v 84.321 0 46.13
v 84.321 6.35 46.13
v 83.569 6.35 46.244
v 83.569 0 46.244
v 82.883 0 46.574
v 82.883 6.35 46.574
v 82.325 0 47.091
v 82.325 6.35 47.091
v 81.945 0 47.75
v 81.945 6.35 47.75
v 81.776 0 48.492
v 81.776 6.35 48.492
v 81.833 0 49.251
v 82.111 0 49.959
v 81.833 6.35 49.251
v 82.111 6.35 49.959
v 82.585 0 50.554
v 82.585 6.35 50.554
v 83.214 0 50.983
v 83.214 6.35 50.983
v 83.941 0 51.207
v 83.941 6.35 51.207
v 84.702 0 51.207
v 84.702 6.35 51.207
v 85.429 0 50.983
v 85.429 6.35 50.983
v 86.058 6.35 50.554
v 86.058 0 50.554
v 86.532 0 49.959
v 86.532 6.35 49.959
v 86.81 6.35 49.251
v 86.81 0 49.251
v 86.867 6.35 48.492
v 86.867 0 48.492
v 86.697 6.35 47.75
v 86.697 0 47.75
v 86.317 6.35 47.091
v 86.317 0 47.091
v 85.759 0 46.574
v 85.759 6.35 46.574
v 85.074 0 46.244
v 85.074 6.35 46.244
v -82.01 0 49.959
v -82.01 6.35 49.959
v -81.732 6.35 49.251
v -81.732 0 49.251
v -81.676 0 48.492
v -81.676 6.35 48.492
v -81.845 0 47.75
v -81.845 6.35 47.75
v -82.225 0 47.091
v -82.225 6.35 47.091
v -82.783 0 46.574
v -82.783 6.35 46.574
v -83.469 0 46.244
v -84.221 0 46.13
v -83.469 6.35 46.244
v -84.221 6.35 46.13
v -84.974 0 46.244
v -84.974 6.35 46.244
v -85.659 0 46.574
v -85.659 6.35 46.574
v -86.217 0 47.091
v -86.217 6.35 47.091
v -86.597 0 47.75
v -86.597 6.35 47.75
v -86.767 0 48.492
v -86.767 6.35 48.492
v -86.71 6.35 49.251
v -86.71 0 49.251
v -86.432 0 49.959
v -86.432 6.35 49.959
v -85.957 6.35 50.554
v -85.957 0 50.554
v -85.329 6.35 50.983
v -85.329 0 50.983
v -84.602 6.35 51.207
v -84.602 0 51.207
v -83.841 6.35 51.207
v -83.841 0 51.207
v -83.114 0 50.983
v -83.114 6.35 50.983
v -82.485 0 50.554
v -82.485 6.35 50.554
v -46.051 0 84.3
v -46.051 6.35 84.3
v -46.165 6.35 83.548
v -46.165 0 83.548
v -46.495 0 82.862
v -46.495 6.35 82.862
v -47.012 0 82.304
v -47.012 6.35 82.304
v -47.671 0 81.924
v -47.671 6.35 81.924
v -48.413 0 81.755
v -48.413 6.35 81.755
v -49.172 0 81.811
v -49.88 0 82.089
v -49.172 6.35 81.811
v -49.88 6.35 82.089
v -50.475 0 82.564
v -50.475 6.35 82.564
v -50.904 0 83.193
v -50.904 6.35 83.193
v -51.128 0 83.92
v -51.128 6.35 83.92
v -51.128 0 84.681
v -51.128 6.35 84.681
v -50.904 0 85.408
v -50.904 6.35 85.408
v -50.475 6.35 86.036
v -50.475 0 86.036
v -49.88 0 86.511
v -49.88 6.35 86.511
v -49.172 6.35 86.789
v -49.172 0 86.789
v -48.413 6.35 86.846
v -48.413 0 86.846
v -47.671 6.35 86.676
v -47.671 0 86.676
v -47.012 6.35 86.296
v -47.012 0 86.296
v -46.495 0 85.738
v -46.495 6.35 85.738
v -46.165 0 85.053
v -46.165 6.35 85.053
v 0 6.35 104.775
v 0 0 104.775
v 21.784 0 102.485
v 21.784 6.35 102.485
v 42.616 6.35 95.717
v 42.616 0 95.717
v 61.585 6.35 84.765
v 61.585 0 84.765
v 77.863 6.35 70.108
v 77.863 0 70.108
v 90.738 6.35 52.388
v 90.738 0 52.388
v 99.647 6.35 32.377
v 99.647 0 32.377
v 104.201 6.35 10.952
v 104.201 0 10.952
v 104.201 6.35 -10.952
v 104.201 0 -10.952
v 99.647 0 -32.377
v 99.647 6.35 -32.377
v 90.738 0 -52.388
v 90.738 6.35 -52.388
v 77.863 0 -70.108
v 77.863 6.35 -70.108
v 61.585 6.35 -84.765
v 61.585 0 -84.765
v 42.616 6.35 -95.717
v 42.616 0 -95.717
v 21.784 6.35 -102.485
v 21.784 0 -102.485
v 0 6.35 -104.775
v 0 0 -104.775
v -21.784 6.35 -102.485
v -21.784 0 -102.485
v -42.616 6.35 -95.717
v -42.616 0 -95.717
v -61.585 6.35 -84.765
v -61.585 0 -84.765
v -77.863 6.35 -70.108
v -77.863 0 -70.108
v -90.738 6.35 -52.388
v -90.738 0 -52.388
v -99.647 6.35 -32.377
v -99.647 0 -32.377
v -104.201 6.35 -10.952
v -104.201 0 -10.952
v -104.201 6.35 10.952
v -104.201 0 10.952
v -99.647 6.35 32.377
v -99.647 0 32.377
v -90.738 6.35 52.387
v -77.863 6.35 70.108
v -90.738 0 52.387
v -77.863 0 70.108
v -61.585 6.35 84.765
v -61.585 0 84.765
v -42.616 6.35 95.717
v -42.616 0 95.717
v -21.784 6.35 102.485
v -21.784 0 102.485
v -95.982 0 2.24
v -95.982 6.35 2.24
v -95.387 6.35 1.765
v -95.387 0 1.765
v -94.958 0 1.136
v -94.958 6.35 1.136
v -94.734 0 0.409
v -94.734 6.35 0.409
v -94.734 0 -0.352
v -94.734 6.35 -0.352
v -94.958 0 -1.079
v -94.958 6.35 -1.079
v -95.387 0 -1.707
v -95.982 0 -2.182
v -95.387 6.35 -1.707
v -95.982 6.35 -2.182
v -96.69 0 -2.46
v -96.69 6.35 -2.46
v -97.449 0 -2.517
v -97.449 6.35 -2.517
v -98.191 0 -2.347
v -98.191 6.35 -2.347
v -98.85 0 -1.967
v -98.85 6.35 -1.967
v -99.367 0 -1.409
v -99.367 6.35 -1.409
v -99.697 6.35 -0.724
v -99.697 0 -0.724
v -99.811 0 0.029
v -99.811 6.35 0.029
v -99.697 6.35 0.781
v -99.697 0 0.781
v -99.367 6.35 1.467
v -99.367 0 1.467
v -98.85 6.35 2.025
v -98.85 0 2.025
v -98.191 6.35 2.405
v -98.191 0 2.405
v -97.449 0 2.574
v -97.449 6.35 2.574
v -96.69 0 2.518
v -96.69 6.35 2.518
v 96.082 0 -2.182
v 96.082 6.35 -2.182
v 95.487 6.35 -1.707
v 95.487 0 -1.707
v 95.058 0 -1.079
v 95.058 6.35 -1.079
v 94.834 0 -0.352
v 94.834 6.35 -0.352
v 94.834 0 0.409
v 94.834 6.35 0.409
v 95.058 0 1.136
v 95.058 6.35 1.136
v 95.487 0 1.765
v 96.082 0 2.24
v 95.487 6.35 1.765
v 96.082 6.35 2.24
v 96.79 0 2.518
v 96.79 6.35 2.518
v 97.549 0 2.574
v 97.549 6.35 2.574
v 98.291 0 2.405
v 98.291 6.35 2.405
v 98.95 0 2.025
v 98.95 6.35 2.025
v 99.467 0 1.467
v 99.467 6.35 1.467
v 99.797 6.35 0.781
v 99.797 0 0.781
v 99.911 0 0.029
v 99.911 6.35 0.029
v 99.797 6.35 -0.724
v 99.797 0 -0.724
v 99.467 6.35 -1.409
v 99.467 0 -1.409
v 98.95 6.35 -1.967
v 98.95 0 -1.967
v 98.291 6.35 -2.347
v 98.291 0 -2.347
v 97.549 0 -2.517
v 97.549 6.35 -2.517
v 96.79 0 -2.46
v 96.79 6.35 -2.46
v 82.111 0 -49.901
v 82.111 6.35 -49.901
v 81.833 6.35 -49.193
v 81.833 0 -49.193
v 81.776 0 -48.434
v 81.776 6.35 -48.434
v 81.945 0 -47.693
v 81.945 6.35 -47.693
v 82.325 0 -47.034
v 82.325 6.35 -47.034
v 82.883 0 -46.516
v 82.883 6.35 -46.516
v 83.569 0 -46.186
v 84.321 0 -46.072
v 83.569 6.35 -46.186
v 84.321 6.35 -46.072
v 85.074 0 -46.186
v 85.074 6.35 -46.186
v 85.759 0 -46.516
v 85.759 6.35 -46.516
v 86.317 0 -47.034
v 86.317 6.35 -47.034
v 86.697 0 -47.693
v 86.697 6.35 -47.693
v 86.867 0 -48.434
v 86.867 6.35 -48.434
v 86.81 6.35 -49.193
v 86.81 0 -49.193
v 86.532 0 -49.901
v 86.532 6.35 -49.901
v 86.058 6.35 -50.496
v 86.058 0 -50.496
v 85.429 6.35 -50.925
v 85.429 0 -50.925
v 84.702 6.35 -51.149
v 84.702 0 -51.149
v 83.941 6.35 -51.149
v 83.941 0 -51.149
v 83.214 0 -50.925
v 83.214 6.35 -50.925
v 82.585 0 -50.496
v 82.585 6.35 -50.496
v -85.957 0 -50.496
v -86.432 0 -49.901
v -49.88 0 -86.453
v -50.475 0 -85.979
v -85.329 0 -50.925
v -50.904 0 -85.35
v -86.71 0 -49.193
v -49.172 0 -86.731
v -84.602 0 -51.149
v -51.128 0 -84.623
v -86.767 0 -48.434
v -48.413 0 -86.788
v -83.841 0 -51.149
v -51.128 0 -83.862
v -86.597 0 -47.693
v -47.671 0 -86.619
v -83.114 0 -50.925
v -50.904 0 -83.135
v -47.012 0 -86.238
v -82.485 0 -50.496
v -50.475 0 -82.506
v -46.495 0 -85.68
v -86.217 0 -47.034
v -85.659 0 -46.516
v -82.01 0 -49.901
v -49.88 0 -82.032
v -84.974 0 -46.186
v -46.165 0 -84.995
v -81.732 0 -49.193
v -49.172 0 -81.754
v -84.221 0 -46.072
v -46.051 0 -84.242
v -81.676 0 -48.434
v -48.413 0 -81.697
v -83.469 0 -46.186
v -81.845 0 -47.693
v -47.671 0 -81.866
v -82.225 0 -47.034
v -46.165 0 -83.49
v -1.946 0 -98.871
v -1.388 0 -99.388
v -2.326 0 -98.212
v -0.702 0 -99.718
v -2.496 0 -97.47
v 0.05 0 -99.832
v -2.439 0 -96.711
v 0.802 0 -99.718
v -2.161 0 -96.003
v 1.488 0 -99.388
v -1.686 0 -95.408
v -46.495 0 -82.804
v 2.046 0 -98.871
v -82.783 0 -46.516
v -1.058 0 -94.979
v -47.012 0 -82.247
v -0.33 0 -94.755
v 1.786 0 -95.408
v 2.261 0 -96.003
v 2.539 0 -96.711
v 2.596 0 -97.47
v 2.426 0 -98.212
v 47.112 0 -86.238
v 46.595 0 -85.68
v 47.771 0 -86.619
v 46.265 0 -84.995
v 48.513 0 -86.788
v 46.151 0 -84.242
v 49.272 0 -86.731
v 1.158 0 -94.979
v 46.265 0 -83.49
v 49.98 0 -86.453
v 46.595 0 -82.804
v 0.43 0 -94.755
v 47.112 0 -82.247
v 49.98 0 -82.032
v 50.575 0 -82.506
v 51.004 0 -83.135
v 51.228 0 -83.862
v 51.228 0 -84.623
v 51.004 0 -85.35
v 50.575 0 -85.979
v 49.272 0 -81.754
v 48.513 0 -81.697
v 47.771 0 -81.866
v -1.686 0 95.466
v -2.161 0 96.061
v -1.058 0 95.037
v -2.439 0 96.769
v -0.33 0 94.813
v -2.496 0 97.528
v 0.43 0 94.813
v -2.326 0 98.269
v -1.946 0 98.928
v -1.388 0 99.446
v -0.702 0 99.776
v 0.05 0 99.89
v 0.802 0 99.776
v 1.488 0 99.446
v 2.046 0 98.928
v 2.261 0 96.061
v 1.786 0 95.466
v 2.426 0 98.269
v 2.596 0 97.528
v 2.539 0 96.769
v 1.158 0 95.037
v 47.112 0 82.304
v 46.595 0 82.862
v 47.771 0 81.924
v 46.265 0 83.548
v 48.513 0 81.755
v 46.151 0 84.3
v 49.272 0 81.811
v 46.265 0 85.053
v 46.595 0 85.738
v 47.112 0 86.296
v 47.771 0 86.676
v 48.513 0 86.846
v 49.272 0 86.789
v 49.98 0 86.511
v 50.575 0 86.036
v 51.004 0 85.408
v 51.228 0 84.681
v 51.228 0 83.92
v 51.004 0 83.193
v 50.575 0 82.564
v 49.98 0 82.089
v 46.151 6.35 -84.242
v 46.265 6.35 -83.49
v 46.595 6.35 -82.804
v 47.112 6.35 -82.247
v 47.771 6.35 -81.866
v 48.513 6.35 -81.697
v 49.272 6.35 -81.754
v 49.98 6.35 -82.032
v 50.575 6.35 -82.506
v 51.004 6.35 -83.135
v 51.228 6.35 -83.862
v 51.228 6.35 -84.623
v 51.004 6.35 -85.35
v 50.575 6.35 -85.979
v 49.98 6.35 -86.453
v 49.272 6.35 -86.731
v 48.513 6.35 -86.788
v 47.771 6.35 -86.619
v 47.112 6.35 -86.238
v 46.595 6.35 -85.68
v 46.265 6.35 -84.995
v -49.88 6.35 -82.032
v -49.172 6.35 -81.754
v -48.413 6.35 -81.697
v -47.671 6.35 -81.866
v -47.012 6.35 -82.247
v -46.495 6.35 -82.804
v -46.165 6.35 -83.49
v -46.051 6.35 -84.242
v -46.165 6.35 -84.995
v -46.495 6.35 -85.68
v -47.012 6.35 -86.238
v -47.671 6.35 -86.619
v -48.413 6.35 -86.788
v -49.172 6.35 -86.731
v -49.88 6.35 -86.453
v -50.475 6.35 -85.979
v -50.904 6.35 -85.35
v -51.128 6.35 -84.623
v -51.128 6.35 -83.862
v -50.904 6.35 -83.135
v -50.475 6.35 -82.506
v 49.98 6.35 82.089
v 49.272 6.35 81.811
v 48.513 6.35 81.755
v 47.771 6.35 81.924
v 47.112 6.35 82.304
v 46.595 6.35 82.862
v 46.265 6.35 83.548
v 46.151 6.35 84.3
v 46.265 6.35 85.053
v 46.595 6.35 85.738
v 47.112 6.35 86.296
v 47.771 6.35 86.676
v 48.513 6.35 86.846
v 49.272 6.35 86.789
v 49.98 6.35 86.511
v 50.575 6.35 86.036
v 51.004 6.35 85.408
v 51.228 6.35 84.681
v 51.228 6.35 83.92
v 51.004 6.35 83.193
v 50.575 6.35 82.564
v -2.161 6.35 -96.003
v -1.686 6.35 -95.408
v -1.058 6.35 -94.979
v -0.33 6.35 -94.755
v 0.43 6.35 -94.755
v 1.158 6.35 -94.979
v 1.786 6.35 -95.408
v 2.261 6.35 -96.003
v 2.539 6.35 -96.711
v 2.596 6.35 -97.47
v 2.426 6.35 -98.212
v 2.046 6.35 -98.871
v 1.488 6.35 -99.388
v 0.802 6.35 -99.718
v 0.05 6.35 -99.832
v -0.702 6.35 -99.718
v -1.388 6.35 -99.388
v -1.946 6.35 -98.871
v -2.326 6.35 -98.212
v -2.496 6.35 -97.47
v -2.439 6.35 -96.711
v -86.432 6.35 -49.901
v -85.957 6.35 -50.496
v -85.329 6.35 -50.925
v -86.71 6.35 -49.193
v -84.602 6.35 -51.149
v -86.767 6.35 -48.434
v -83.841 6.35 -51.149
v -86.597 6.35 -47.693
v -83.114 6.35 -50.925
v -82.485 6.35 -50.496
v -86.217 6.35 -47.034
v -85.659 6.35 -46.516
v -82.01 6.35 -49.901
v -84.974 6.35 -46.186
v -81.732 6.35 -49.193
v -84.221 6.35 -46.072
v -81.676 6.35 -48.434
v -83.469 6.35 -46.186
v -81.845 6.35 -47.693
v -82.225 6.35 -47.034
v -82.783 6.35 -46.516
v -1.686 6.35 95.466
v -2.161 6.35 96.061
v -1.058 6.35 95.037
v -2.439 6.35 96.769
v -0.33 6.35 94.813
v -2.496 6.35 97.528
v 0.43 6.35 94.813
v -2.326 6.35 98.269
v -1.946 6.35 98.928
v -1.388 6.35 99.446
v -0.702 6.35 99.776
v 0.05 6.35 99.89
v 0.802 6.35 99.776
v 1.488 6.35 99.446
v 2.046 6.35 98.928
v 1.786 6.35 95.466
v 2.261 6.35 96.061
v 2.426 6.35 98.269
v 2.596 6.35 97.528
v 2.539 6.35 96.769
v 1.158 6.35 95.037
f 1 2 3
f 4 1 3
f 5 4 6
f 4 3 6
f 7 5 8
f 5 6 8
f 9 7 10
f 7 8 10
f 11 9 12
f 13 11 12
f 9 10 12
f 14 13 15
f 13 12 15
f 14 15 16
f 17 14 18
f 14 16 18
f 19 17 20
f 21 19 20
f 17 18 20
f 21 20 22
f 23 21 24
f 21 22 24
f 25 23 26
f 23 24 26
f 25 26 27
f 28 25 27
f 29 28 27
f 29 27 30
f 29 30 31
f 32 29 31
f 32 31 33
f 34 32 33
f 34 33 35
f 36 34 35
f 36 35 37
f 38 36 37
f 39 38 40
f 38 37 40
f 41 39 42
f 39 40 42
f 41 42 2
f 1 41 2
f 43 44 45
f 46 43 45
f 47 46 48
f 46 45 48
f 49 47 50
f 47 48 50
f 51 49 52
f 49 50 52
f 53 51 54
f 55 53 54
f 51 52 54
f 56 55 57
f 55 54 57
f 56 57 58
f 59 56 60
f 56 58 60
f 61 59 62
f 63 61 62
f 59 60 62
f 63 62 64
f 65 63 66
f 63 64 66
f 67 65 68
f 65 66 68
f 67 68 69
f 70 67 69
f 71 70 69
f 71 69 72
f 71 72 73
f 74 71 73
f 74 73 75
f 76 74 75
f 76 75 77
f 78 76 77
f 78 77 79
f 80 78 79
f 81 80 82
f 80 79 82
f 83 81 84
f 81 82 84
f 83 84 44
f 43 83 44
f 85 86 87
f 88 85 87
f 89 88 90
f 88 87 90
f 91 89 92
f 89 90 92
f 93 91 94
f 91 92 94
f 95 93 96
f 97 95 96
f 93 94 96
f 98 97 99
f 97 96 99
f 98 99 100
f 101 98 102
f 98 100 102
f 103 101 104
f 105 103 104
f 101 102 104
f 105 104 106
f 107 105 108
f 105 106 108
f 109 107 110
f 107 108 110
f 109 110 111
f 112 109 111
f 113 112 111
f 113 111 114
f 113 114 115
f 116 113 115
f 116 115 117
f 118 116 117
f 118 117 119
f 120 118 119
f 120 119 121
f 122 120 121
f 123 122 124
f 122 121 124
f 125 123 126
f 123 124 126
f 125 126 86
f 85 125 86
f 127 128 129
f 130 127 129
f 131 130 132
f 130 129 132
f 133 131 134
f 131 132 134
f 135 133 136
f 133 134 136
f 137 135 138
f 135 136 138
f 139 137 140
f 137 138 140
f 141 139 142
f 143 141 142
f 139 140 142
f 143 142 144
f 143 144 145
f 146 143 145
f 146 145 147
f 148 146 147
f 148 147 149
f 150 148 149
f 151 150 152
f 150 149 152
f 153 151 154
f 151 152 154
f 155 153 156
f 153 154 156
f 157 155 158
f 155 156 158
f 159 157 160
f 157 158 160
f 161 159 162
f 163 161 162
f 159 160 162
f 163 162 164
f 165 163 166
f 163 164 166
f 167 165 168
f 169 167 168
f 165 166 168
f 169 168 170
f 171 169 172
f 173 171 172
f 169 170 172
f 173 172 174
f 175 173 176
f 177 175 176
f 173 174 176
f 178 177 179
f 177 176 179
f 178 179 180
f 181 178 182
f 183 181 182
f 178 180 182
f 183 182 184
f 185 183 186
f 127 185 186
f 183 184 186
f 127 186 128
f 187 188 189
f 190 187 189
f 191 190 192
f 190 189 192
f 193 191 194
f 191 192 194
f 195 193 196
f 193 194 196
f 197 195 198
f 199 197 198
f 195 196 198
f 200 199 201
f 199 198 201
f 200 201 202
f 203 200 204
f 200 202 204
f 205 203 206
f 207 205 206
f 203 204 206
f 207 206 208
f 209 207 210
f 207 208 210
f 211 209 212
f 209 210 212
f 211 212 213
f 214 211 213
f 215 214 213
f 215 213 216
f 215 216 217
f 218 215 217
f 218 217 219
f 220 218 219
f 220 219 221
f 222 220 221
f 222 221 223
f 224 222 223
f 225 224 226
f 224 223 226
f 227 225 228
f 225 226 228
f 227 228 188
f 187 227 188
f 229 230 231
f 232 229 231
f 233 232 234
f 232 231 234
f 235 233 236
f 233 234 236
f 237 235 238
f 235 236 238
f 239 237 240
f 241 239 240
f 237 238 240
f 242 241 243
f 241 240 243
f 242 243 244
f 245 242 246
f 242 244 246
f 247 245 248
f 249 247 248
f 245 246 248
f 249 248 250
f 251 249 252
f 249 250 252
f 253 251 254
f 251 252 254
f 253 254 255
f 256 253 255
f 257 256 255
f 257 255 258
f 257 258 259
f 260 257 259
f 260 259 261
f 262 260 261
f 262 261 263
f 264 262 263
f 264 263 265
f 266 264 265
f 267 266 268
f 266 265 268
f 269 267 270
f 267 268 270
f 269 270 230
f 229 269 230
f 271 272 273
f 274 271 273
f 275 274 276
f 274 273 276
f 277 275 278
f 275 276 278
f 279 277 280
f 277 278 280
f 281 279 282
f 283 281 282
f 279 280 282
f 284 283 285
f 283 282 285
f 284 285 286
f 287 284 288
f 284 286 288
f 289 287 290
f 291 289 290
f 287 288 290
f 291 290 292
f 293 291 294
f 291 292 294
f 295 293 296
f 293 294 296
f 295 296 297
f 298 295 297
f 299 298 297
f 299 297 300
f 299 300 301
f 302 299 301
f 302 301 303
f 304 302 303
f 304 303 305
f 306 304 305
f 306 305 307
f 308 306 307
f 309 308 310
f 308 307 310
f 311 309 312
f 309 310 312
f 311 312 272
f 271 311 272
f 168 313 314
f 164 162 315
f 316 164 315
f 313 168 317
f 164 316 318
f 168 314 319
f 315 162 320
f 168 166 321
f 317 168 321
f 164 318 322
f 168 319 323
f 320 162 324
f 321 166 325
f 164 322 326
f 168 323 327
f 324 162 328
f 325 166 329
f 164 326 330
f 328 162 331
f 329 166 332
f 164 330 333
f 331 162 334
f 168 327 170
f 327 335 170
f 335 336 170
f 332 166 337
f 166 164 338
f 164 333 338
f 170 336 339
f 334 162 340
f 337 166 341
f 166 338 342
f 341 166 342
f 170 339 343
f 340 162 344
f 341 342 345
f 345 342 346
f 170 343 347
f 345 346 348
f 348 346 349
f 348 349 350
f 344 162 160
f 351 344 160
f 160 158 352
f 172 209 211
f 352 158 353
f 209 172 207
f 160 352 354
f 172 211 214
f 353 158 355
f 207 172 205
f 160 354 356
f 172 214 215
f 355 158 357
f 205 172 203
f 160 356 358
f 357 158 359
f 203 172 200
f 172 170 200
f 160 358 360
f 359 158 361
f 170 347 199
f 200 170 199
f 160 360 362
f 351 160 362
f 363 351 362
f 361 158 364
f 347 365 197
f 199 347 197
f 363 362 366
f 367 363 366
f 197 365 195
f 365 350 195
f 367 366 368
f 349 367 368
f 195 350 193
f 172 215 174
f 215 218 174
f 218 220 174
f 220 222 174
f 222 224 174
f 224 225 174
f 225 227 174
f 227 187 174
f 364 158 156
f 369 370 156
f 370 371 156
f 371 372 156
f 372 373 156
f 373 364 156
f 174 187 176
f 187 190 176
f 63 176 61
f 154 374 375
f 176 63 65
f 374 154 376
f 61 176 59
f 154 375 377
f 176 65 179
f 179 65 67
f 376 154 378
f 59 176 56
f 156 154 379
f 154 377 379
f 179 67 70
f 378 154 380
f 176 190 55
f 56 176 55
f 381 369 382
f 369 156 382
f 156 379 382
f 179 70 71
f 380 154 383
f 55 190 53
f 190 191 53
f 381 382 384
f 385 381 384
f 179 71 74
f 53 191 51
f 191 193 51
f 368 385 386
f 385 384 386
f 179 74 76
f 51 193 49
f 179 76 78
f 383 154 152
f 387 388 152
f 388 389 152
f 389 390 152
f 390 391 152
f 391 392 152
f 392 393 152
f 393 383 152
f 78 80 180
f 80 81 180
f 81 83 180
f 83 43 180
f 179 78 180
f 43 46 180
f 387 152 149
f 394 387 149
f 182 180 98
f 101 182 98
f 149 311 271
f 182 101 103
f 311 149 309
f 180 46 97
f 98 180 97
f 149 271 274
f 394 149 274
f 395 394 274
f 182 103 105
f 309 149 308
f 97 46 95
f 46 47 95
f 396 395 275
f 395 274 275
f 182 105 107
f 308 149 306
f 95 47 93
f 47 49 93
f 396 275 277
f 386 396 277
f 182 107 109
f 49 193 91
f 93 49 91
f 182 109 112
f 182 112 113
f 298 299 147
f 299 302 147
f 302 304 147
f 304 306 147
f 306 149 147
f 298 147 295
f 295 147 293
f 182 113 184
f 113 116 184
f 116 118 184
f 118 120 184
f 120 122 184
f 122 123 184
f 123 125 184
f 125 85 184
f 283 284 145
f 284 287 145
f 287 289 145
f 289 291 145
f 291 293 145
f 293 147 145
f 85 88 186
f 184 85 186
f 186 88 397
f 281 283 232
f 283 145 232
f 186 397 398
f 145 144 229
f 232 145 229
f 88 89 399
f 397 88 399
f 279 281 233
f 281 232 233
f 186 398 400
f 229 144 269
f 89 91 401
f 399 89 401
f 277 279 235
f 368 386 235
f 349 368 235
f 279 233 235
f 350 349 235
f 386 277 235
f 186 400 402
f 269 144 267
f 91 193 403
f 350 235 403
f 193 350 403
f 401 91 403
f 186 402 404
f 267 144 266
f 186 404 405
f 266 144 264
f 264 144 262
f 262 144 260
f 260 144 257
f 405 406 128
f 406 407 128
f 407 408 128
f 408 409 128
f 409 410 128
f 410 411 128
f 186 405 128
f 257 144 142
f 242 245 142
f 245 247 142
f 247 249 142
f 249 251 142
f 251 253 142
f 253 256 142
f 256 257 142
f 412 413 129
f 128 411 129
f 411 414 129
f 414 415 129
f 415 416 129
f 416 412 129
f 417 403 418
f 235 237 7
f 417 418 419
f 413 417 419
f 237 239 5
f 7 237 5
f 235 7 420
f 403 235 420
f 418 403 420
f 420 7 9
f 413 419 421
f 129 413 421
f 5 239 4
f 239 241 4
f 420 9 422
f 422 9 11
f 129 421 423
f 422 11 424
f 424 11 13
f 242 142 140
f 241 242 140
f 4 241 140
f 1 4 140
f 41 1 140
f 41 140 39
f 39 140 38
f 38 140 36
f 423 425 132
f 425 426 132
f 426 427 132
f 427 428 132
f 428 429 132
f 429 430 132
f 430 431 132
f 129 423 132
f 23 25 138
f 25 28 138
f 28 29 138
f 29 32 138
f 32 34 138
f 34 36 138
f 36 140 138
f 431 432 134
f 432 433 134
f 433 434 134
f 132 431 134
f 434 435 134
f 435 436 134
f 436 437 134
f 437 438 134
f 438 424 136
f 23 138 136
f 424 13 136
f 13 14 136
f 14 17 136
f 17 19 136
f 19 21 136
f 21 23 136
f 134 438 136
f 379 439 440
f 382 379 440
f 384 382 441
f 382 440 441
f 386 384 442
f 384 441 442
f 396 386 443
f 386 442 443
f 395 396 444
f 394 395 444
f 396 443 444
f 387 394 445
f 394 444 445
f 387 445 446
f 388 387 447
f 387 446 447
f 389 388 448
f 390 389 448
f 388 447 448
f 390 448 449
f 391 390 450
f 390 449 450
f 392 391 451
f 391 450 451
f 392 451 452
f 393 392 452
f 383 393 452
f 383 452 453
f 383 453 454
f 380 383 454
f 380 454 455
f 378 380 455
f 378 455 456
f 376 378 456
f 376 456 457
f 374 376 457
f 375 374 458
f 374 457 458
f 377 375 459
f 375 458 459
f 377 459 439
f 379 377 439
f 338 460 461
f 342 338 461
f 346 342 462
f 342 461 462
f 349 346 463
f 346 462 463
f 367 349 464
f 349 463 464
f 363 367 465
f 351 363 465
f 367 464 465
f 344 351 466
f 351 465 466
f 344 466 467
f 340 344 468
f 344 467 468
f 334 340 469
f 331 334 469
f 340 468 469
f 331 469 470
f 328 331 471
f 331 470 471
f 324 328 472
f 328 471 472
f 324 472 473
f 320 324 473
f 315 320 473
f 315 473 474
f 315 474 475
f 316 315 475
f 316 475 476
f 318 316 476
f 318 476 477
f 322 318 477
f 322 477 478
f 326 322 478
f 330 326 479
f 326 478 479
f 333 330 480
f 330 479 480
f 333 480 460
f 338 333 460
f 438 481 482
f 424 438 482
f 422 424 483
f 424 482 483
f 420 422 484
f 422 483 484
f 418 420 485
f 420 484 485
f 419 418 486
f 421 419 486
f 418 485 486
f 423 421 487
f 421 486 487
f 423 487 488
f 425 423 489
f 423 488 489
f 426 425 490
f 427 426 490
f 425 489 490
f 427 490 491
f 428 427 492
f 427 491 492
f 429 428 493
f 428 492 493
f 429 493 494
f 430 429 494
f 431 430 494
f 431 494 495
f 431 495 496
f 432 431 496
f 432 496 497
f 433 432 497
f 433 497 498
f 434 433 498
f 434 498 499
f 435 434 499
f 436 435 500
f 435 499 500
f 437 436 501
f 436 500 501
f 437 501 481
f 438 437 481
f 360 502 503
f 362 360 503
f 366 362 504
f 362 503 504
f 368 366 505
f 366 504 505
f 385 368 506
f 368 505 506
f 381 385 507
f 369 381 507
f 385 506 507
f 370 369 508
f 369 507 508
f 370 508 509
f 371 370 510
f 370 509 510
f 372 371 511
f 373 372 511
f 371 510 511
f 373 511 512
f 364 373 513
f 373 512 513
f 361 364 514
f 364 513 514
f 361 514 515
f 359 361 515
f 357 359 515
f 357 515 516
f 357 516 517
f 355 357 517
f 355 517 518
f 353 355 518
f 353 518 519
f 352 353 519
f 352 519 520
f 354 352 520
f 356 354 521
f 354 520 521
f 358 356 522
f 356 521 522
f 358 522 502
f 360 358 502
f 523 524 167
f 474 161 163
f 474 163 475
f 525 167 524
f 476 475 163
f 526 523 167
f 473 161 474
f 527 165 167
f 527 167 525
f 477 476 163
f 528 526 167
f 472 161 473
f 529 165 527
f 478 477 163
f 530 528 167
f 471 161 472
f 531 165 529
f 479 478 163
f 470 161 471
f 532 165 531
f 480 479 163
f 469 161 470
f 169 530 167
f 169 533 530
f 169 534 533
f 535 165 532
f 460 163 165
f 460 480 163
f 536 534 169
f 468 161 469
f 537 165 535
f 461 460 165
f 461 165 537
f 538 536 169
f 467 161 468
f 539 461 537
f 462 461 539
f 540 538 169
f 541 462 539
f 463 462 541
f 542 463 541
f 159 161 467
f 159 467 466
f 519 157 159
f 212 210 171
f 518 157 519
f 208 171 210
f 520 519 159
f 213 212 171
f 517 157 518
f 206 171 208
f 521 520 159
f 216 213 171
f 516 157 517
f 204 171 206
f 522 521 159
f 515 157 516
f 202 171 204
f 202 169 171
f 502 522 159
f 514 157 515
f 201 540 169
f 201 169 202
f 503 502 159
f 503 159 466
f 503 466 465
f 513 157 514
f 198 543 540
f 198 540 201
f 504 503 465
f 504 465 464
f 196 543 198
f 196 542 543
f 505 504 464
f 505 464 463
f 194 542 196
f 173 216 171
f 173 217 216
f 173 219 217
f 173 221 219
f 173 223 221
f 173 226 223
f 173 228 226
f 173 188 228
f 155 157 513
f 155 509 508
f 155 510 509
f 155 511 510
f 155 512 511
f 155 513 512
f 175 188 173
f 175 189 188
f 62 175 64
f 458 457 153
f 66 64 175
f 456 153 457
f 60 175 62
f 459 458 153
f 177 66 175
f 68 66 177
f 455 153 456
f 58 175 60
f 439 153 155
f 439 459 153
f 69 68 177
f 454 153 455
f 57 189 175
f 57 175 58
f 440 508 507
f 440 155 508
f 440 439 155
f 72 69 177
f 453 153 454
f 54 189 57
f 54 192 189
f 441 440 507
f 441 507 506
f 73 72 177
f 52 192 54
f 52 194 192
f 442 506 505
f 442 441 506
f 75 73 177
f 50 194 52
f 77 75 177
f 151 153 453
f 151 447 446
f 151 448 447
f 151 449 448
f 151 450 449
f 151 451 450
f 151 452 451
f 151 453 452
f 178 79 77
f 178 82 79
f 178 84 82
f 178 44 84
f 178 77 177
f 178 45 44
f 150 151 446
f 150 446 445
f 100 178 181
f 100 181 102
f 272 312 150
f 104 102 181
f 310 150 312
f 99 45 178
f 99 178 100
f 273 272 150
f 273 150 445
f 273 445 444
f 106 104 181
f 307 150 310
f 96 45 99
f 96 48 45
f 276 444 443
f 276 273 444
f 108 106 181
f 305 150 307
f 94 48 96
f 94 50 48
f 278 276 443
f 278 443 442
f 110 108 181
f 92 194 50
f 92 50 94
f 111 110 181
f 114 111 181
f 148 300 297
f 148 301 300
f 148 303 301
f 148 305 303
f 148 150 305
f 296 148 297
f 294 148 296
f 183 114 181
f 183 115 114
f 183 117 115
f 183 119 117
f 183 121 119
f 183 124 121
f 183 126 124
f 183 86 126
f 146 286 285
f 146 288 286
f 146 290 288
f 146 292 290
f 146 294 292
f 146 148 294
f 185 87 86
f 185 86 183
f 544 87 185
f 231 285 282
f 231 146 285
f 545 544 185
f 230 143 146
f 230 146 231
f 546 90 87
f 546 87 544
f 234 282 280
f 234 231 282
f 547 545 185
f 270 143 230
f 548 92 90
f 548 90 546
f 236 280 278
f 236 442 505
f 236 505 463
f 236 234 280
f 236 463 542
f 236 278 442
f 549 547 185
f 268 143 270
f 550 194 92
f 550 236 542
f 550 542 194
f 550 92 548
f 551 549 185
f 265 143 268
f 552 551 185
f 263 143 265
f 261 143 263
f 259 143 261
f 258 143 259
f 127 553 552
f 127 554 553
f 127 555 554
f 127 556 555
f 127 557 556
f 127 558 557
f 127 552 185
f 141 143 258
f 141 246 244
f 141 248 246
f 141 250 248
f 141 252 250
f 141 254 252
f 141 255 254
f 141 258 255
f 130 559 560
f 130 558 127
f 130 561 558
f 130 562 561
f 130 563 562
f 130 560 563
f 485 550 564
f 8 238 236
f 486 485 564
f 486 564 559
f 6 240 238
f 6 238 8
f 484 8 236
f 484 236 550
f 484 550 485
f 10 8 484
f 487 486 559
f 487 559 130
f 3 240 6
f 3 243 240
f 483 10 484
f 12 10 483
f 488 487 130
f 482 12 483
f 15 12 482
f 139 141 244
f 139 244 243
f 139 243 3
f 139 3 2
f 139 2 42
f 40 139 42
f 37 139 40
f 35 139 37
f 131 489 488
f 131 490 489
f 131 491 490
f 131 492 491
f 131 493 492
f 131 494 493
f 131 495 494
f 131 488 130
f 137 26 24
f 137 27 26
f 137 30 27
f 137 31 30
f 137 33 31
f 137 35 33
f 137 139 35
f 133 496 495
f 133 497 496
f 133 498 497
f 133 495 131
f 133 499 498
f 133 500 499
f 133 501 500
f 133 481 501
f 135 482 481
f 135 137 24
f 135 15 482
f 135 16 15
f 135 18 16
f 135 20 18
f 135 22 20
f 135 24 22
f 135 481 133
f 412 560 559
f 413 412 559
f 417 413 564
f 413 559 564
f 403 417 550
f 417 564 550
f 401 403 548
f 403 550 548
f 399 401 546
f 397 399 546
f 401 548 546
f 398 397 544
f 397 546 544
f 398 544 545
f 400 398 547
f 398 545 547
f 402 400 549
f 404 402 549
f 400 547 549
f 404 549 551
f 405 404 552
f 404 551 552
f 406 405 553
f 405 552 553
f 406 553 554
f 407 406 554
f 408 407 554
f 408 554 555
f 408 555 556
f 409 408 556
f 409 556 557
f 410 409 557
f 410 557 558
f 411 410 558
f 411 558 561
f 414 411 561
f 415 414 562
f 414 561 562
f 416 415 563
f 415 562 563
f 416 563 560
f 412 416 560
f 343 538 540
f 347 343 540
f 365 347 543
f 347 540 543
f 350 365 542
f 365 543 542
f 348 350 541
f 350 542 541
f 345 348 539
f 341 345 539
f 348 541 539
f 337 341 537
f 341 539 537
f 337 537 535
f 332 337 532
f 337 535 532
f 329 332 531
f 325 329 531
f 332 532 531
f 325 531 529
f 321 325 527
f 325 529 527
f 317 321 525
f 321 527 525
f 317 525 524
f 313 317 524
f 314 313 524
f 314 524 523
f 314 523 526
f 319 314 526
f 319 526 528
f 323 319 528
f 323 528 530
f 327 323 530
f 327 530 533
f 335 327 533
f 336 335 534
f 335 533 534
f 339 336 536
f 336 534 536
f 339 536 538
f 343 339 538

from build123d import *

# Parameters (mm, degrees)
SKETCH2_R          = 104.775
FACE_PLATE_DEPTH   = 6.35
SKETCH3_R          = 2.5527
CUT_EXTRUDE1_DEPTH = 6.35
CIRPATTERN1_COUNT  = 12


with BuildPart() as part:
    # Sketch2 → Face Plate (new body)
    with BuildSketch(Plane(origin=(0, 0, 0), x_dir=(1, 0, 0), z_dir=(0, 1, 0))):
        with Locations(Location((0, 0, 0), (0, 0, 270))):
            Circle(SKETCH2_R)
    extrude(amount=FACE_PLATE_DEPTH)

    # Sketch3 → Cut-Extrude1 (cut)
    with BuildSketch(Plane(origin=(0, 6.35, 0), x_dir=(1, 0, 0), z_dir=(0, 1, 0))):
        with Locations(Location((-84.221187023, 48.625125, 0), (0, 0, 270))):
            Circle(SKETCH3_R)
    cut_extrude1 = extrude(amount=-CUT_EXTRUDE1_DEPTH, mode=Mode.SUBTRACT)

    # CirPattern1: Cut-Extrude1 ×12 about axis
    cirpattern1_axis = Axis((0.050022276, 0, 0.028880374), (0, 1, 0))
    for i in range(1, CIRPATTERN1_COUNT):
        add(cut_extrude1.rotate(cirpattern1_axis, i * 360 / CIRPATTERN1_COUNT), mode=Mode.SUBTRACT)


solid = part.part
